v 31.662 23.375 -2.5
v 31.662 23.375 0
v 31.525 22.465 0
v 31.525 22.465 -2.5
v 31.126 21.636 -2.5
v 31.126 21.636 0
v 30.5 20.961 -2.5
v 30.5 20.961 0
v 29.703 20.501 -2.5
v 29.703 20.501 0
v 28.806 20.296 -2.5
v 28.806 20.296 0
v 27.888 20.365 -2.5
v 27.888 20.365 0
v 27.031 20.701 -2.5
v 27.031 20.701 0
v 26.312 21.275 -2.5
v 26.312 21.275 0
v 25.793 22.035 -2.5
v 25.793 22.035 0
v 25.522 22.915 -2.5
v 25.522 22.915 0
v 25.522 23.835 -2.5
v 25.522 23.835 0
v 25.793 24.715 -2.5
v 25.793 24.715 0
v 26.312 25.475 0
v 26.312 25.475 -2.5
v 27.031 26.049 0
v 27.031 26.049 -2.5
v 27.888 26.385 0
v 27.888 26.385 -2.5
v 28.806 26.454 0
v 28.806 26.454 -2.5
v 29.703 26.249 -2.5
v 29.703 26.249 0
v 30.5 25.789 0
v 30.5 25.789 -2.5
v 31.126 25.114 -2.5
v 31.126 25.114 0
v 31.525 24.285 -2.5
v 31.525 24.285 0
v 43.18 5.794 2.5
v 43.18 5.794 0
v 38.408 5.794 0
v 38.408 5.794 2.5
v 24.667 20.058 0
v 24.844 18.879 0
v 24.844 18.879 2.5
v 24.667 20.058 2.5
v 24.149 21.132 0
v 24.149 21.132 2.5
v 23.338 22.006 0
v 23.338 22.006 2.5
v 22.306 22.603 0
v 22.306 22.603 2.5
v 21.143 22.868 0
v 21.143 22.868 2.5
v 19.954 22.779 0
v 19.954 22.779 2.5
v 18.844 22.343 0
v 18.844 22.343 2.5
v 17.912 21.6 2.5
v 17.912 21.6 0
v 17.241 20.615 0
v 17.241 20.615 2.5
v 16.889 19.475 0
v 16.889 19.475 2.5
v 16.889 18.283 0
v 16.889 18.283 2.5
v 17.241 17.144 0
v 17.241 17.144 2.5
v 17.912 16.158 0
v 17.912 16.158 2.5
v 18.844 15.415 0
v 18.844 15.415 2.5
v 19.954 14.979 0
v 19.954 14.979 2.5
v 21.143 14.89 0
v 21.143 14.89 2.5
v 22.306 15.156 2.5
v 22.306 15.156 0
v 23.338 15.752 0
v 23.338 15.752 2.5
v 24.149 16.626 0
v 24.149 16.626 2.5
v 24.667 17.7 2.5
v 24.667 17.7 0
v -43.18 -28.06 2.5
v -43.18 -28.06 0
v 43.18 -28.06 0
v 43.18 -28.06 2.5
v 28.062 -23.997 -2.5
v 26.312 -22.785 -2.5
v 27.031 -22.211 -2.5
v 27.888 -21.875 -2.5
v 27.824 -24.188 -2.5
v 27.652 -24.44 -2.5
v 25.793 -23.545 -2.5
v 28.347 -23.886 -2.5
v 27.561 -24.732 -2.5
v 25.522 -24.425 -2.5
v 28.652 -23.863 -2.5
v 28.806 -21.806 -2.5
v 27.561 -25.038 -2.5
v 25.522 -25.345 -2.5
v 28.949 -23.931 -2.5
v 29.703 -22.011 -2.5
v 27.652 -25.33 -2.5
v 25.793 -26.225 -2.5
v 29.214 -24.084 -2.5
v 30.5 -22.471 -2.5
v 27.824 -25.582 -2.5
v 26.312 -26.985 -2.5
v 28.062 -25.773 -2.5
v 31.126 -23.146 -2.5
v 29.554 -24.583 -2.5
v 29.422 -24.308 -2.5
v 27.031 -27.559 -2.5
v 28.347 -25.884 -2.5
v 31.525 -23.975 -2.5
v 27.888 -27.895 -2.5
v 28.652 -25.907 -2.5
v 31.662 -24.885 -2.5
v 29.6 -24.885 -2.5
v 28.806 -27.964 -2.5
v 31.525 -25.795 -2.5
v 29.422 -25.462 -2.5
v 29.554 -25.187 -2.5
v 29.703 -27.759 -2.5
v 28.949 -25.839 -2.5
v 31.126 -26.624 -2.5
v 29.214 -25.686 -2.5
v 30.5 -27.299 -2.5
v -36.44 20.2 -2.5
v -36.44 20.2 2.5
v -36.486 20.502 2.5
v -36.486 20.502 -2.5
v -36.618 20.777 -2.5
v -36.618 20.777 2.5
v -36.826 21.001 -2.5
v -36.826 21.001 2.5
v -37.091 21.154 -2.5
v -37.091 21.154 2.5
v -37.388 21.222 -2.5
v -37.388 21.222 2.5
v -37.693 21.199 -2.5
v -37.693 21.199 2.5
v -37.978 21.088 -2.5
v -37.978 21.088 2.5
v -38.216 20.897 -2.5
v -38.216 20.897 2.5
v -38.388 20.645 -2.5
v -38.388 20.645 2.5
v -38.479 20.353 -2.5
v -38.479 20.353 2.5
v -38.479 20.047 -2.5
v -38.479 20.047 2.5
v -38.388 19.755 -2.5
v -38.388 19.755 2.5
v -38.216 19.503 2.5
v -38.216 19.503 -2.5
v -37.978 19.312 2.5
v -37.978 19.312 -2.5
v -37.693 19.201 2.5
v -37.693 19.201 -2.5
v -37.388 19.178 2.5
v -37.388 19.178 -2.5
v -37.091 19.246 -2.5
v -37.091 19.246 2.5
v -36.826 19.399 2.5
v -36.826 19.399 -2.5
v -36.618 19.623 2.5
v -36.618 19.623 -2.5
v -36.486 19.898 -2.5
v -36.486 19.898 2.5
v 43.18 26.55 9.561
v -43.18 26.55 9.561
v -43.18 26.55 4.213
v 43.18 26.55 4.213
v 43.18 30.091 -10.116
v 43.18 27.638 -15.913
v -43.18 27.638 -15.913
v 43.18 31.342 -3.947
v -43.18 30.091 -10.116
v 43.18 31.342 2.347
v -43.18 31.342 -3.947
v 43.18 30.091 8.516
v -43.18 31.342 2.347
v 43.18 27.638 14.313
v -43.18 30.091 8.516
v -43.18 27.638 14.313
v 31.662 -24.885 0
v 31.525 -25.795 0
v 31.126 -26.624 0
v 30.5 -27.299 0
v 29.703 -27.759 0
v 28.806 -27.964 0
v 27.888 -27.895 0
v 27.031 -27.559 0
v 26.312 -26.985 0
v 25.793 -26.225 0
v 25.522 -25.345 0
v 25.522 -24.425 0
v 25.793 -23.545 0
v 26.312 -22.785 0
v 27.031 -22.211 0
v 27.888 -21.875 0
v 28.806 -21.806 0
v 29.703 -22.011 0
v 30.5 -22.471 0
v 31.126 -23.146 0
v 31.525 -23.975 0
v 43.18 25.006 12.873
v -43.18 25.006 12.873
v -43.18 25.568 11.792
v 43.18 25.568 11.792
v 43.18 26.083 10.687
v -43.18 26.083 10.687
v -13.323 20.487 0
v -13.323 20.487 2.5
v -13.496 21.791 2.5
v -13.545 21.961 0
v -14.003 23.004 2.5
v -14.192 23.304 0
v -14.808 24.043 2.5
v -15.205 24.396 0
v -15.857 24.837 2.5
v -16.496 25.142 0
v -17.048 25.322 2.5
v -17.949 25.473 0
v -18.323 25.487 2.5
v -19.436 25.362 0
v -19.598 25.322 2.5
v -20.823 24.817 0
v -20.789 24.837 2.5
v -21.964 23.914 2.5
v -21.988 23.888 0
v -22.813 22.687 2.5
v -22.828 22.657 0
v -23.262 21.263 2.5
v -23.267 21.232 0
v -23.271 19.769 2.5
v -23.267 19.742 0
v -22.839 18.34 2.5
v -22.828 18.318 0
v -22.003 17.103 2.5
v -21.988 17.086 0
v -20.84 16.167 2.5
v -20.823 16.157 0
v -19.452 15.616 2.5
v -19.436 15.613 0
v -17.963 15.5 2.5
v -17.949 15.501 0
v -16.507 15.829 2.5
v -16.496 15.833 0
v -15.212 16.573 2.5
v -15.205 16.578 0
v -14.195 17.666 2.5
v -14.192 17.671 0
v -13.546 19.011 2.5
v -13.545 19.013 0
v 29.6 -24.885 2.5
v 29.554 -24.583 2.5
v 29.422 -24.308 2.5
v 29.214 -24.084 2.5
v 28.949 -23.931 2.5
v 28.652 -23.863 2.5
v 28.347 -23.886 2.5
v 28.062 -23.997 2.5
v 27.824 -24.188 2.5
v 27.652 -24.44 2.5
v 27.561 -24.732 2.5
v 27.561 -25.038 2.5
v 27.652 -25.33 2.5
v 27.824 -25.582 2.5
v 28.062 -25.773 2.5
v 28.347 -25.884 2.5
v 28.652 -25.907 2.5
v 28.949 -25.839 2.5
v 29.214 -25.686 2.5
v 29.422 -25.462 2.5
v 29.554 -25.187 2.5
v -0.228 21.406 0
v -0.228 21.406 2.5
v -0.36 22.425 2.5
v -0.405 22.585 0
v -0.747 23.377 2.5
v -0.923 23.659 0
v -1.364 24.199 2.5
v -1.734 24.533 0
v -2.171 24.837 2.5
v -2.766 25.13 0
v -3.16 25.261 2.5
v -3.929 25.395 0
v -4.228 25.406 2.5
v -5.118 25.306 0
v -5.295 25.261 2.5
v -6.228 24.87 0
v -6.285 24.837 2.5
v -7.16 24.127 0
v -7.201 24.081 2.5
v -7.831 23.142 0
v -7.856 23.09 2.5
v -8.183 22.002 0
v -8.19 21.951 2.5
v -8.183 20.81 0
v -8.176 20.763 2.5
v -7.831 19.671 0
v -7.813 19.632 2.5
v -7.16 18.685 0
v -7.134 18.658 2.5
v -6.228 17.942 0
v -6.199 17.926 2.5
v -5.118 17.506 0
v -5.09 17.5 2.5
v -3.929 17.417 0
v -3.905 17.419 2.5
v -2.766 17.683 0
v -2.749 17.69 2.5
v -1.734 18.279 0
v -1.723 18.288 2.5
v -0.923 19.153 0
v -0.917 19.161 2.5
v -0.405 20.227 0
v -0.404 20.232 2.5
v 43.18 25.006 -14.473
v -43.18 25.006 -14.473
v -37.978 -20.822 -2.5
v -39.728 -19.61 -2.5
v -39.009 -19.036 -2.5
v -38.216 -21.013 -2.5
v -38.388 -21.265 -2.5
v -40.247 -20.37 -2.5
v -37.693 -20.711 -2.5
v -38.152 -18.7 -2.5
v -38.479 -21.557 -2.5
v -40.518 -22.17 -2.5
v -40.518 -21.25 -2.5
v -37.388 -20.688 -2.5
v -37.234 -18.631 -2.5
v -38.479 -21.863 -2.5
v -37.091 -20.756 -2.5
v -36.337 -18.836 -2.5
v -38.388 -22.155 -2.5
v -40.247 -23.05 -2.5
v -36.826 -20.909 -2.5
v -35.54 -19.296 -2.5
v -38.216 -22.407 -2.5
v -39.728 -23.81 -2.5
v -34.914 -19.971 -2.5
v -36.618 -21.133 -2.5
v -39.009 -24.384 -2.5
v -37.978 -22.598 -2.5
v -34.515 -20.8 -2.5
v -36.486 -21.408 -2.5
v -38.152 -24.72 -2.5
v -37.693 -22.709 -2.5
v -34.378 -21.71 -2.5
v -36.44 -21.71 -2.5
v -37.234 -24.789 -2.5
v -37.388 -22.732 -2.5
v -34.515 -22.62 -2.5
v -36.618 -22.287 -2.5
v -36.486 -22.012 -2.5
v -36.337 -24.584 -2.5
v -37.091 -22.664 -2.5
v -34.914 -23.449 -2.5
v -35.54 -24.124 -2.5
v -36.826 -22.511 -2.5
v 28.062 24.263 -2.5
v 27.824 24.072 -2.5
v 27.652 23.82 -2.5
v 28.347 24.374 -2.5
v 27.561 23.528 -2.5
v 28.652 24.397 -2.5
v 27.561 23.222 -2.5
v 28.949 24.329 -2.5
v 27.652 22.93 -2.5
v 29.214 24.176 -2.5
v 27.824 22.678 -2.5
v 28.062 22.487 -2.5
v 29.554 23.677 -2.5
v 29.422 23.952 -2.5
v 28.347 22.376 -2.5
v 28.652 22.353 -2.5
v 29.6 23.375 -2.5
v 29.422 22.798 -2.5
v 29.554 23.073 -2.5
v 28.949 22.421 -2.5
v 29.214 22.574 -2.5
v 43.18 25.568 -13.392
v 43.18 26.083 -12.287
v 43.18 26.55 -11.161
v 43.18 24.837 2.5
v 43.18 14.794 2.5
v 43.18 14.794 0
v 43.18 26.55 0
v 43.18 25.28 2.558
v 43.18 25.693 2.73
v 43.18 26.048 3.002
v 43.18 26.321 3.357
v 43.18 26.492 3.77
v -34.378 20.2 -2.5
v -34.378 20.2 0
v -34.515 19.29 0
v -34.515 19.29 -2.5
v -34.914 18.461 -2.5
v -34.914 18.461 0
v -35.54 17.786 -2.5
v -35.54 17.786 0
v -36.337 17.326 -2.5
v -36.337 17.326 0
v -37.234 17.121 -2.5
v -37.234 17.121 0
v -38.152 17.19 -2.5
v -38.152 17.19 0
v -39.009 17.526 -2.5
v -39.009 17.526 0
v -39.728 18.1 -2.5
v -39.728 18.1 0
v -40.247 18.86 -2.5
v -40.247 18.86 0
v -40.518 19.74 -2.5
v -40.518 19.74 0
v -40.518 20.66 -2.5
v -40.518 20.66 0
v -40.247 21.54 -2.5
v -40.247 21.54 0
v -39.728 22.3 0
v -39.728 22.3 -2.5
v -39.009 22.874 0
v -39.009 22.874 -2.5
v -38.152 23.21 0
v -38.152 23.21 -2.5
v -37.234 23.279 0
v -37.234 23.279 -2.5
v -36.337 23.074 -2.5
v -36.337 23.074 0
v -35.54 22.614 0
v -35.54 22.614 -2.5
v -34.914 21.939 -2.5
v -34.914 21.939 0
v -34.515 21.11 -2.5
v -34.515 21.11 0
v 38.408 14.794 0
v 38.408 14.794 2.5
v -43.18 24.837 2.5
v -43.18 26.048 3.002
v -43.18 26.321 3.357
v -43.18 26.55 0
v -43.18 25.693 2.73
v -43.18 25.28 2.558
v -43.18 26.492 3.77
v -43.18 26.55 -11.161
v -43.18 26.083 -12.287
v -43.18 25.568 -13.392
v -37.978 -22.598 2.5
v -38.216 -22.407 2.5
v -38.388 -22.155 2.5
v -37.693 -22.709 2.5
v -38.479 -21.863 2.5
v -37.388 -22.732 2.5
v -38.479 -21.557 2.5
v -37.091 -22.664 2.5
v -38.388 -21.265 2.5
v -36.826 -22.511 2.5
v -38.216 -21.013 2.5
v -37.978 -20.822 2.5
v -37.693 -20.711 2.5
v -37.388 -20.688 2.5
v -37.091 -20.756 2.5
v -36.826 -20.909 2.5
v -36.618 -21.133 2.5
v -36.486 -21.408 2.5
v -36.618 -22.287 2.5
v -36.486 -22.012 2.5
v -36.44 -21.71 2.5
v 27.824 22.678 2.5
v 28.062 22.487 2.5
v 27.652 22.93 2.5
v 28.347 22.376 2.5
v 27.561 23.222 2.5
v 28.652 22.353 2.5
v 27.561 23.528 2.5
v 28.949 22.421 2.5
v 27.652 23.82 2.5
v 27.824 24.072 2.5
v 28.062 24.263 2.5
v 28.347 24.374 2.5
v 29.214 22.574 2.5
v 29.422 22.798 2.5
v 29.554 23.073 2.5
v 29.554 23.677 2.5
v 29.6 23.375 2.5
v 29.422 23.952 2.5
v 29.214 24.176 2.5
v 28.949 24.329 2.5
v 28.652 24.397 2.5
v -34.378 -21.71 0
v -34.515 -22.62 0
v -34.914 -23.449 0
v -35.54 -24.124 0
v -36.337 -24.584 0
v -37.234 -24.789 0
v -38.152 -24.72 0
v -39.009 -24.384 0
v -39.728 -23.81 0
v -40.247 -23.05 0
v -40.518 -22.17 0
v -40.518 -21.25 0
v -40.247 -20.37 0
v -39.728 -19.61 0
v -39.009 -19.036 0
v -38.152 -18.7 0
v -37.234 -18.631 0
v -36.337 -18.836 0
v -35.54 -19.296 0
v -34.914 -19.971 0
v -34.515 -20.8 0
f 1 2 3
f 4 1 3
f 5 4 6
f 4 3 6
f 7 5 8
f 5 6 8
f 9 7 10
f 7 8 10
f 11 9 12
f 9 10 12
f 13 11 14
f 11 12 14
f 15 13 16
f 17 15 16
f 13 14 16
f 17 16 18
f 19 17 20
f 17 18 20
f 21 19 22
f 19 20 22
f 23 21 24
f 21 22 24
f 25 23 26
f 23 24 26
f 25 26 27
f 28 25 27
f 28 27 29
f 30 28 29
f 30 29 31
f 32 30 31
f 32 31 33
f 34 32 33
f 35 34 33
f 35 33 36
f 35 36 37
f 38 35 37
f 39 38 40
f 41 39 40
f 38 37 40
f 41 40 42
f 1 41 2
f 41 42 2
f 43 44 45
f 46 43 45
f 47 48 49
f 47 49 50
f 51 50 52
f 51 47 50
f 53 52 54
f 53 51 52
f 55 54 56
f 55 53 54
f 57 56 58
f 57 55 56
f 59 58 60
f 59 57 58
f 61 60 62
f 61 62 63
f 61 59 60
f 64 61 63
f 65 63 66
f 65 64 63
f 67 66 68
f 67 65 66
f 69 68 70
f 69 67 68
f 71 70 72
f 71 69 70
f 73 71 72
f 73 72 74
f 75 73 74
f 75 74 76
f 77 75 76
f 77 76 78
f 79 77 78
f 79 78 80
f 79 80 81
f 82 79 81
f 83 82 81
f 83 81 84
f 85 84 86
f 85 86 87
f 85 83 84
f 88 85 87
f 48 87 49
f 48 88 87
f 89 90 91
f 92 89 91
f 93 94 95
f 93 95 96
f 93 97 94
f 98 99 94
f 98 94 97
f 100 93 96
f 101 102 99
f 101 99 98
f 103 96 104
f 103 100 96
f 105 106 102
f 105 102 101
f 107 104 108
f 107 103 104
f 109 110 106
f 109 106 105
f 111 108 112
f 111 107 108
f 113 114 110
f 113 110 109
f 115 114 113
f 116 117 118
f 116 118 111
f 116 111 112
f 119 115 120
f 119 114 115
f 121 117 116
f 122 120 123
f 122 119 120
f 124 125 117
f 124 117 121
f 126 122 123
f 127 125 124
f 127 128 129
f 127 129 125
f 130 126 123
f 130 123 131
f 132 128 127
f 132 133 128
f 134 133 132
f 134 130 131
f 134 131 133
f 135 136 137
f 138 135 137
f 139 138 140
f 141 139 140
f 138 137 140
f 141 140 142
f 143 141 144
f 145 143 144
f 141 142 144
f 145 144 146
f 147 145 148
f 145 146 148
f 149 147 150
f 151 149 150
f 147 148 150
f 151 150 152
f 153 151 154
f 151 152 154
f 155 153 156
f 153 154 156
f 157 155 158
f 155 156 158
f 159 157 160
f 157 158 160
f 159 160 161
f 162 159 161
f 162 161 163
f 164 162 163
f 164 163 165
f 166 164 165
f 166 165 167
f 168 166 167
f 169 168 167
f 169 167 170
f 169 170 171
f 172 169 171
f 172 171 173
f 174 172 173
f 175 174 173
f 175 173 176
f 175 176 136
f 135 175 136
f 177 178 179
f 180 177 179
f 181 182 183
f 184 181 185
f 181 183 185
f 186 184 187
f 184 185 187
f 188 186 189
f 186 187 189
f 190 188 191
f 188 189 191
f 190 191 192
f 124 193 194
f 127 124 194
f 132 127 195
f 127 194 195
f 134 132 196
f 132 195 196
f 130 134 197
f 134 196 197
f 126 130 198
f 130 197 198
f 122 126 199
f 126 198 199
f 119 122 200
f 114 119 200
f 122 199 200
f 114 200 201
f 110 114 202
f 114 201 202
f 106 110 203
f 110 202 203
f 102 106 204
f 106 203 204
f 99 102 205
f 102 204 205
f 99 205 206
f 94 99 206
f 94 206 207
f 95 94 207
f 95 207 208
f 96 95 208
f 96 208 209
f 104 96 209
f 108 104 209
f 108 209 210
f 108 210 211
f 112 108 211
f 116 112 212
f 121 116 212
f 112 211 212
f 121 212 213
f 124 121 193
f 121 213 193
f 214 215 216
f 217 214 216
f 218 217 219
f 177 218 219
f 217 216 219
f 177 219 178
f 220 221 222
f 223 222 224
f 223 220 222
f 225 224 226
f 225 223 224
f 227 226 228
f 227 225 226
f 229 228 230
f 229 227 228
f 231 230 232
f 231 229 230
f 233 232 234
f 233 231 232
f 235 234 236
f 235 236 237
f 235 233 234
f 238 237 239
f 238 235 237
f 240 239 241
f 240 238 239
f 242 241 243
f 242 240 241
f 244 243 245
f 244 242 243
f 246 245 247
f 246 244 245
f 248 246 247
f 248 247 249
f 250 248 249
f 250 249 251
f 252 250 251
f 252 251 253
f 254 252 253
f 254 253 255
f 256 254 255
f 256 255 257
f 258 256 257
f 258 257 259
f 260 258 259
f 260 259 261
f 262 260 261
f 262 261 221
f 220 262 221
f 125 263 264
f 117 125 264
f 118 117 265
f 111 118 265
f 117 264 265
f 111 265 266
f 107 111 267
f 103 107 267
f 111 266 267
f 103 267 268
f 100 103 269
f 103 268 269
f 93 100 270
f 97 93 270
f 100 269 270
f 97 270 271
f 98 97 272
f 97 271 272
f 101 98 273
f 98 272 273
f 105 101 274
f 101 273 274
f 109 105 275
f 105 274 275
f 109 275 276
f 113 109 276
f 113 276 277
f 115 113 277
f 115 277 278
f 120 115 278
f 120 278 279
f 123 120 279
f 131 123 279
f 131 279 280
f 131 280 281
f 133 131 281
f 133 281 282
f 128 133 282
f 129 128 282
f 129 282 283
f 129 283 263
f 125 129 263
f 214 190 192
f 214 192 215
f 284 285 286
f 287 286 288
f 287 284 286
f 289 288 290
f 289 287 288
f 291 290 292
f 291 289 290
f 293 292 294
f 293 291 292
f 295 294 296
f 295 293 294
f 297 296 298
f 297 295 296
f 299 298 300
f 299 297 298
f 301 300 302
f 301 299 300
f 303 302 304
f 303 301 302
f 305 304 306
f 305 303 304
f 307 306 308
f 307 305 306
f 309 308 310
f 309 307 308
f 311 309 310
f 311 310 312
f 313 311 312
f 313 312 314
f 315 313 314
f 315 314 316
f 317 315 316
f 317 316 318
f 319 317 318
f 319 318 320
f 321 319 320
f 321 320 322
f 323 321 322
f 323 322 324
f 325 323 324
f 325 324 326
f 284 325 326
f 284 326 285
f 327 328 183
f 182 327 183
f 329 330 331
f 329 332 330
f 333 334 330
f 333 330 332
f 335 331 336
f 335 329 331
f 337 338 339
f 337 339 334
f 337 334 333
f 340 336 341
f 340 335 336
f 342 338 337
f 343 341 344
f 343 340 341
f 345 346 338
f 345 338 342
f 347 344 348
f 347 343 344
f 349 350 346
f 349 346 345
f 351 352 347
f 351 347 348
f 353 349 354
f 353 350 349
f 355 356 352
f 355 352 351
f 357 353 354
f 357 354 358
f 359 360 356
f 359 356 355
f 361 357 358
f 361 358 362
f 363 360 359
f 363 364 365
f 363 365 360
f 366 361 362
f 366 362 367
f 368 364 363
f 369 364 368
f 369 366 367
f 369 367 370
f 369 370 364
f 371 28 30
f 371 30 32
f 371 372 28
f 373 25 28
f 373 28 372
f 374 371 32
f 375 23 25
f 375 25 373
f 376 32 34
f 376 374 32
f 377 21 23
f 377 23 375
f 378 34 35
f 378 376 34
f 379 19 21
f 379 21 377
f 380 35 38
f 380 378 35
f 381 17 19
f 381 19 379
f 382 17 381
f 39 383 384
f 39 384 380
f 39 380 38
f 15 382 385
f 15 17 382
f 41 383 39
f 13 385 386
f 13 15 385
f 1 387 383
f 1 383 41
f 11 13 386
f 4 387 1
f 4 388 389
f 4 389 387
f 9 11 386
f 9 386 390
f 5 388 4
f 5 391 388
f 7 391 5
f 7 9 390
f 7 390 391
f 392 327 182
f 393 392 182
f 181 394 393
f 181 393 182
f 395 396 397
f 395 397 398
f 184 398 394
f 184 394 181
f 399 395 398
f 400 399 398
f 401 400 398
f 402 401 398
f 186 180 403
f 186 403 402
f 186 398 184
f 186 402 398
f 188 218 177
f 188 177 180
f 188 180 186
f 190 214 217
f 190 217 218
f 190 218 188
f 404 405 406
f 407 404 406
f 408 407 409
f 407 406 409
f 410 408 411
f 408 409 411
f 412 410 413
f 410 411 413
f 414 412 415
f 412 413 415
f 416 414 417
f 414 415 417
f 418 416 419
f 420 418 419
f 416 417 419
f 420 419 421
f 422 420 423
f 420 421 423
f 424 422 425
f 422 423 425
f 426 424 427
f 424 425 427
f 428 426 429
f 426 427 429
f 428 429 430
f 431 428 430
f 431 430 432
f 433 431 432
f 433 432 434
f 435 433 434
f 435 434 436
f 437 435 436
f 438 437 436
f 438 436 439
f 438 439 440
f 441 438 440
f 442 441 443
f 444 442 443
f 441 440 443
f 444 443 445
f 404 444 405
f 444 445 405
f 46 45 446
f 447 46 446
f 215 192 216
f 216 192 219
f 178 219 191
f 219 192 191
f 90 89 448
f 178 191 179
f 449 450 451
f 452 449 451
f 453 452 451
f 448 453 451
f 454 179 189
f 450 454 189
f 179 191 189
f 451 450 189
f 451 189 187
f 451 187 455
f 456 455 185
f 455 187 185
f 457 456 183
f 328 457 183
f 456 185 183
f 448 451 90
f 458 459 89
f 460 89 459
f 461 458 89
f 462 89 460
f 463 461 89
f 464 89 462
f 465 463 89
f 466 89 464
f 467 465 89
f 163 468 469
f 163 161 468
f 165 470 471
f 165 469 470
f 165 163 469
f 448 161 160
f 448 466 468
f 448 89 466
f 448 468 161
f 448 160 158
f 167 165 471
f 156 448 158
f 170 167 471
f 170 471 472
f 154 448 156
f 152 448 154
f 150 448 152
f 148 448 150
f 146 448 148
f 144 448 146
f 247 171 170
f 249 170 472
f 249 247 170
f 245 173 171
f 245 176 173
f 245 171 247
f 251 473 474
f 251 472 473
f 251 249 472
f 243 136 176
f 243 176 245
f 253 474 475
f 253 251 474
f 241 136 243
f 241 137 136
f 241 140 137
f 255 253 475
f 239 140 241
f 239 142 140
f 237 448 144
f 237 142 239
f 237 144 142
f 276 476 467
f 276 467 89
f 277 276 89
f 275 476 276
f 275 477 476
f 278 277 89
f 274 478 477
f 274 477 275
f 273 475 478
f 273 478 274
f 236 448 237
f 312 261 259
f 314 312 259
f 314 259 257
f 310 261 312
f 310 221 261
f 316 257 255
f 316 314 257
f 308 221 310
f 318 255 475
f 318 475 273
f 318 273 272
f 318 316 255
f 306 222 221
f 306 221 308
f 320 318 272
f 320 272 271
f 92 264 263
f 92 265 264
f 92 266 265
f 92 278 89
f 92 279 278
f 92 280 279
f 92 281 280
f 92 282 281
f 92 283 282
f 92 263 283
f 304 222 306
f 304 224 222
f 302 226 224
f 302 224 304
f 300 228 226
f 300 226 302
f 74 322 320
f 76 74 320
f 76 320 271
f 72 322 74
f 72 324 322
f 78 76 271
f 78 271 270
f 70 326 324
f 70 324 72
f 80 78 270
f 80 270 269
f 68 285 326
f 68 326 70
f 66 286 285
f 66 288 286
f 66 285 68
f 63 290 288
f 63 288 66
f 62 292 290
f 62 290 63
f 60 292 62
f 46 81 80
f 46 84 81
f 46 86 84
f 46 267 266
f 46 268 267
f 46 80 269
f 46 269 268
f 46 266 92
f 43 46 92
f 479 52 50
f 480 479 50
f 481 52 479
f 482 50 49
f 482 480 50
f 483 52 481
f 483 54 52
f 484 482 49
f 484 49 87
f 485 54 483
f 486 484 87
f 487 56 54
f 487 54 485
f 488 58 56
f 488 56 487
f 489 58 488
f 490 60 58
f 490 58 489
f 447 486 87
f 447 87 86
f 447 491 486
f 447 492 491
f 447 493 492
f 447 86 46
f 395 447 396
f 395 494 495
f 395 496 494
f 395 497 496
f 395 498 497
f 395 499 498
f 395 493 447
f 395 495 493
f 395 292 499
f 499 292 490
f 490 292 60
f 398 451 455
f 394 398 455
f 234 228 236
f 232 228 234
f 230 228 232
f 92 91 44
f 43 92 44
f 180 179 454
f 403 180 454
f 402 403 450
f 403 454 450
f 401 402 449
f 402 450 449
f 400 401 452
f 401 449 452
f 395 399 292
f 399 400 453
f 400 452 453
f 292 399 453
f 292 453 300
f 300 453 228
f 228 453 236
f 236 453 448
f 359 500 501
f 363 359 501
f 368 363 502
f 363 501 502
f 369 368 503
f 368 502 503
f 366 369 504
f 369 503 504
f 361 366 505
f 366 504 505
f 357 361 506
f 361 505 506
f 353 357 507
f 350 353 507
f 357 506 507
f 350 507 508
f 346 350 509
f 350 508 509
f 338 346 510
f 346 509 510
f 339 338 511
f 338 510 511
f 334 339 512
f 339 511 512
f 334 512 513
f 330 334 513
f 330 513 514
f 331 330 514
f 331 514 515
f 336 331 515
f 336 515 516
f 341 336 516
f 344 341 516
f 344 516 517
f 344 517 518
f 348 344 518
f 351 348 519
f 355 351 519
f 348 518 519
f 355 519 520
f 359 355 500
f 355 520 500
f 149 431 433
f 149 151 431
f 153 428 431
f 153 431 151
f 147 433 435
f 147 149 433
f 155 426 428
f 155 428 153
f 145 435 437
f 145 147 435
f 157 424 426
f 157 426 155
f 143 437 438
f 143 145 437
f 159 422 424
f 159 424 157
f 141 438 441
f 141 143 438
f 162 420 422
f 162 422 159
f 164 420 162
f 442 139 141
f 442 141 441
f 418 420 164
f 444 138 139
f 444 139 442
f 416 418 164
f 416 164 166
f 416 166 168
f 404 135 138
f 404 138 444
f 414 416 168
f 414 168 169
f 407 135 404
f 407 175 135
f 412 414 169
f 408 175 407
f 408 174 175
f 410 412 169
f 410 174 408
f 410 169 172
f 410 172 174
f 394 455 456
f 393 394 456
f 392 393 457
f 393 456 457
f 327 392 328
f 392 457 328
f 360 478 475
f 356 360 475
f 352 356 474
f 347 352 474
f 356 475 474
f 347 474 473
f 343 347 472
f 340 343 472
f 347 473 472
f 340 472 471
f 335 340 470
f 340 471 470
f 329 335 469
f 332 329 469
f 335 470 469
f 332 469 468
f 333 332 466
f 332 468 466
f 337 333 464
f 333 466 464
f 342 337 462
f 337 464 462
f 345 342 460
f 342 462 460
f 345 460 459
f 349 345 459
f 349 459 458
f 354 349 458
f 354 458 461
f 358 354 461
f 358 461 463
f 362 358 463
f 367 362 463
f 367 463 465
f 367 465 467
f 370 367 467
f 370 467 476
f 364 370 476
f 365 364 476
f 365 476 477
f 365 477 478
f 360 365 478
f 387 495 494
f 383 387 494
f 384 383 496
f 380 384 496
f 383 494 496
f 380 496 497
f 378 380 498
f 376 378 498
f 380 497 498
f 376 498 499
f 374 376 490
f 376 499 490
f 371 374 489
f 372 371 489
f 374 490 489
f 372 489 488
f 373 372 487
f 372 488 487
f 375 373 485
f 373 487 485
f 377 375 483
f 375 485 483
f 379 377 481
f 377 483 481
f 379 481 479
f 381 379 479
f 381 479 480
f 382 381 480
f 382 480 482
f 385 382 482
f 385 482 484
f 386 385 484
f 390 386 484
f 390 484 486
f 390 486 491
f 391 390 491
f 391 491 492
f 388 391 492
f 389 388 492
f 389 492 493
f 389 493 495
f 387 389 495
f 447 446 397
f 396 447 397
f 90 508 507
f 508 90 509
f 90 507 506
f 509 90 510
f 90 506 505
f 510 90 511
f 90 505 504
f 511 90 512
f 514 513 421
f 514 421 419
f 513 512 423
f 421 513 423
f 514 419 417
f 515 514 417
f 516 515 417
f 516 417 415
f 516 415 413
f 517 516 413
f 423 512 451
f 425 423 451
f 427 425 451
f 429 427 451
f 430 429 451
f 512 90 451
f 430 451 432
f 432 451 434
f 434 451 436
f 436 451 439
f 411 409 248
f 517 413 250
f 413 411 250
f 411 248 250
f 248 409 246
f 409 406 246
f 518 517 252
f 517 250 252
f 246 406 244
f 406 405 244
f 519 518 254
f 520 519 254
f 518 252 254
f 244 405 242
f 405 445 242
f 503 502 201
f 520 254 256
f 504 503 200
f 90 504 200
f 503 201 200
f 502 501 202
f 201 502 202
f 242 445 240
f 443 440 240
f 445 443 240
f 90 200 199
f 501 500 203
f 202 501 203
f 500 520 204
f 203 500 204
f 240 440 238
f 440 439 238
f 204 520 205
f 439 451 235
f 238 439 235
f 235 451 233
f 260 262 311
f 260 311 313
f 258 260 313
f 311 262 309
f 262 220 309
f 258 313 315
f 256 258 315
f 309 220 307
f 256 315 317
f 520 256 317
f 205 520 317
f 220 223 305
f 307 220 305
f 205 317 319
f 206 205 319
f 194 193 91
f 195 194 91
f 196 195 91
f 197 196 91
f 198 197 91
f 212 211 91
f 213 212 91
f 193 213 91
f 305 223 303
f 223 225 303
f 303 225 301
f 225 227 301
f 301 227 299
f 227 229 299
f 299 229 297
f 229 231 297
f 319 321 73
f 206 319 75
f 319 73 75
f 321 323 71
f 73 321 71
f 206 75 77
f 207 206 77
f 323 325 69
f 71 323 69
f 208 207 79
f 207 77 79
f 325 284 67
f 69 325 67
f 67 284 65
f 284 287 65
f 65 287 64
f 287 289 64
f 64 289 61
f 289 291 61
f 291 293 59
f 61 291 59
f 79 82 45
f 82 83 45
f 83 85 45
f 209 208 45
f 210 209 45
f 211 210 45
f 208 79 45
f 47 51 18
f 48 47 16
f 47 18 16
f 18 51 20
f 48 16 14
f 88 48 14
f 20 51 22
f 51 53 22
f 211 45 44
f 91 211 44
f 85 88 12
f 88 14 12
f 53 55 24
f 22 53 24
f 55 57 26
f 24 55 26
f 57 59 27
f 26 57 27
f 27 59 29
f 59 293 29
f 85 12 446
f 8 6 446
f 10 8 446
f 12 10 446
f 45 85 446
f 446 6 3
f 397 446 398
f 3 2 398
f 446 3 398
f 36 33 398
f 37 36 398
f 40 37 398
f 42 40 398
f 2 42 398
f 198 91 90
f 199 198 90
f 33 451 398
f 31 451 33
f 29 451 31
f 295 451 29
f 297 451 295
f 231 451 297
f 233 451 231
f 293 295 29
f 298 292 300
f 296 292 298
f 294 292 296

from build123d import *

# Parameters (mm, degrees)
ESBO_O1_R                                 = 5
ESBO_O1_R_2                               = 4
RESSALTO_EXTRUS_O4_DEPTH                  = 2.5
ESBO_O7_R                                 = 3.0875
RESSALTO_EXTRUS_O5_DEPTH                  = 2.5
BROCA_DE_ROSQUEAR_PARA_TARRAXA_DE_M2_51_D = 2.05
RESSALTO_EXTRUS_O6_REACH                  = 92.839


with BuildPart() as part:
    # Esboço1 → Ressalto-extrusão4 (new body)
    with BuildSketch(Plane.XY):
        Polygon((36.83, 26.550055291), (-30.48, 26.550055291), (-43.18, 26.550055291), (-43.18, 13.850055291), (-43.18, -15.359944709), (-43.18, -28.059944709), (-30.48, -28.059944709), (36.83, -28.059944709), (43.18, -28.059944709), (43.18, -21.709944709), (43.18, 5.794055291), (38.407682724, 5.794055291), (38.407682724, 14.794055291), (43.18, 14.794055291), (43.18, 20.200055291), (43.18, 26.550055291), align=None)
        with Locations((-18.322924579, 20.487241898)):
            Circle(ESBO_O1_R, mode=Mode.SUBTRACT)
        with Locations((-4.227566255, 21.406055391)):
            Circle(ESBO_O1_R_2, mode=Mode.SUBTRACT)
        with Locations((20.844433745, 18.879055391)):
            Circle(ESBO_O1_R_2, mode=Mode.SUBTRACT)
    extrude(amount=RESSALTO_EXTRUS_O4_DEPTH)

    # Esboço7 → Ressalto-extrusão5 (add)
    with BuildSketch(Plane(origin=(0, 0, 0), x_dir=(-1, 0, 0), z_dir=(0, 0, -1))):
        with Locations(Location((37.465, -21.709944709, 0), (0, 0, 180))):
            Circle(ESBO_O7_R)
        with Locations(Location((37.465, 20.200055291, 0), (0, 0, 180))):
            Circle(ESBO_O7_R)
        with Locations(Location((-28.575, 23.375055291, 0), (0, 0, 180))):
            Circle(ESBO_O7_R)
        with Locations(Location((-28.575, -24.884944709, 0), (0, 0, 180))):
            Circle(ESBO_O7_R)
    extrude(amount=RESSALTO_EXTRUS_O5_DEPTH)

    # Broca de rosquear para tarraxa de M2.51 (through all)
    with Locations(Plane(origin=(28.575, 23.375055291, -2.5), x_dir=(-1, 0, 0), z_dir=(0, 0, -1))):
        with Locations((0, 0), (66.04, -3.175), (0, -48.26), (66.04, -45.085)):
            Hole(BROCA_DE_ROSQUEAR_PARA_TARRAXA_DE_M2_51_D / 2)

    # Ressalto-extrusão6: up to this face of the body (flat: up to its plane)
    ressalto_extrus_o6_end = Plane(part.part.faces().sort_by_distance((43.18, 20.672055291, 1.25))[0])
    # Esboço9 → Ressalto-extrusão6 (add, up to the picked face)
    with BuildSketch(Plane.ZY.offset(43.18), mode=Mode.PRIVATE) as ressalto_extrus_o6_sk1:
        with BuildLine():
            Line((2.5, 24.836642303), (2.5, 26.550055291))
            Line((2.5, 26.550055291), (0, 26.550055291))
            Line((0, 26.550055291), (-11.160722179, 26.550055291))
            ThreePointArc((-11.160722179, 26.550055291), (-12.841855689, 25.831060984), (-14.473425786, 25.005747885))
            Line((-14.473425786, 25.005747885), (-15.912733763, 27.637931873))
            ThreePointArc((-15.912733763, 27.637931873), (-0.8, 31.5), (14.312733763, 27.637931873))
            Line((14.312733763, 27.637931873), (12.873425786, 25.005747885))
            ThreePointArc((12.873425786, 25.005747885), (11.241855689, 25.831060984), (9.560722179, 26.550055291))
            Line((9.560722179, 26.550055291), (4.213412987, 26.550055291))
            ThreePointArc((4.213412987, 26.550055291), (3.001847045, 26.048208246), (2.5, 24.836642303))
        make_face()
    ressalto_extrus_o6_tool1 = split(extrude(ressalto_extrus_o6_sk1.sketch, amount=-RESSALTO_EXTRUS_O6_REACH, mode=Mode.PRIVATE), bisect_by=ressalto_extrus_o6_end, keep=Keep.BOTH, mode=Mode.PRIVATE)
    add(ressalto_extrus_o6_tool1.solids().sort_by(Axis((-43.18, 28.43855, -0.780308), (1, 0, 0)))[0])


solid = part.part
